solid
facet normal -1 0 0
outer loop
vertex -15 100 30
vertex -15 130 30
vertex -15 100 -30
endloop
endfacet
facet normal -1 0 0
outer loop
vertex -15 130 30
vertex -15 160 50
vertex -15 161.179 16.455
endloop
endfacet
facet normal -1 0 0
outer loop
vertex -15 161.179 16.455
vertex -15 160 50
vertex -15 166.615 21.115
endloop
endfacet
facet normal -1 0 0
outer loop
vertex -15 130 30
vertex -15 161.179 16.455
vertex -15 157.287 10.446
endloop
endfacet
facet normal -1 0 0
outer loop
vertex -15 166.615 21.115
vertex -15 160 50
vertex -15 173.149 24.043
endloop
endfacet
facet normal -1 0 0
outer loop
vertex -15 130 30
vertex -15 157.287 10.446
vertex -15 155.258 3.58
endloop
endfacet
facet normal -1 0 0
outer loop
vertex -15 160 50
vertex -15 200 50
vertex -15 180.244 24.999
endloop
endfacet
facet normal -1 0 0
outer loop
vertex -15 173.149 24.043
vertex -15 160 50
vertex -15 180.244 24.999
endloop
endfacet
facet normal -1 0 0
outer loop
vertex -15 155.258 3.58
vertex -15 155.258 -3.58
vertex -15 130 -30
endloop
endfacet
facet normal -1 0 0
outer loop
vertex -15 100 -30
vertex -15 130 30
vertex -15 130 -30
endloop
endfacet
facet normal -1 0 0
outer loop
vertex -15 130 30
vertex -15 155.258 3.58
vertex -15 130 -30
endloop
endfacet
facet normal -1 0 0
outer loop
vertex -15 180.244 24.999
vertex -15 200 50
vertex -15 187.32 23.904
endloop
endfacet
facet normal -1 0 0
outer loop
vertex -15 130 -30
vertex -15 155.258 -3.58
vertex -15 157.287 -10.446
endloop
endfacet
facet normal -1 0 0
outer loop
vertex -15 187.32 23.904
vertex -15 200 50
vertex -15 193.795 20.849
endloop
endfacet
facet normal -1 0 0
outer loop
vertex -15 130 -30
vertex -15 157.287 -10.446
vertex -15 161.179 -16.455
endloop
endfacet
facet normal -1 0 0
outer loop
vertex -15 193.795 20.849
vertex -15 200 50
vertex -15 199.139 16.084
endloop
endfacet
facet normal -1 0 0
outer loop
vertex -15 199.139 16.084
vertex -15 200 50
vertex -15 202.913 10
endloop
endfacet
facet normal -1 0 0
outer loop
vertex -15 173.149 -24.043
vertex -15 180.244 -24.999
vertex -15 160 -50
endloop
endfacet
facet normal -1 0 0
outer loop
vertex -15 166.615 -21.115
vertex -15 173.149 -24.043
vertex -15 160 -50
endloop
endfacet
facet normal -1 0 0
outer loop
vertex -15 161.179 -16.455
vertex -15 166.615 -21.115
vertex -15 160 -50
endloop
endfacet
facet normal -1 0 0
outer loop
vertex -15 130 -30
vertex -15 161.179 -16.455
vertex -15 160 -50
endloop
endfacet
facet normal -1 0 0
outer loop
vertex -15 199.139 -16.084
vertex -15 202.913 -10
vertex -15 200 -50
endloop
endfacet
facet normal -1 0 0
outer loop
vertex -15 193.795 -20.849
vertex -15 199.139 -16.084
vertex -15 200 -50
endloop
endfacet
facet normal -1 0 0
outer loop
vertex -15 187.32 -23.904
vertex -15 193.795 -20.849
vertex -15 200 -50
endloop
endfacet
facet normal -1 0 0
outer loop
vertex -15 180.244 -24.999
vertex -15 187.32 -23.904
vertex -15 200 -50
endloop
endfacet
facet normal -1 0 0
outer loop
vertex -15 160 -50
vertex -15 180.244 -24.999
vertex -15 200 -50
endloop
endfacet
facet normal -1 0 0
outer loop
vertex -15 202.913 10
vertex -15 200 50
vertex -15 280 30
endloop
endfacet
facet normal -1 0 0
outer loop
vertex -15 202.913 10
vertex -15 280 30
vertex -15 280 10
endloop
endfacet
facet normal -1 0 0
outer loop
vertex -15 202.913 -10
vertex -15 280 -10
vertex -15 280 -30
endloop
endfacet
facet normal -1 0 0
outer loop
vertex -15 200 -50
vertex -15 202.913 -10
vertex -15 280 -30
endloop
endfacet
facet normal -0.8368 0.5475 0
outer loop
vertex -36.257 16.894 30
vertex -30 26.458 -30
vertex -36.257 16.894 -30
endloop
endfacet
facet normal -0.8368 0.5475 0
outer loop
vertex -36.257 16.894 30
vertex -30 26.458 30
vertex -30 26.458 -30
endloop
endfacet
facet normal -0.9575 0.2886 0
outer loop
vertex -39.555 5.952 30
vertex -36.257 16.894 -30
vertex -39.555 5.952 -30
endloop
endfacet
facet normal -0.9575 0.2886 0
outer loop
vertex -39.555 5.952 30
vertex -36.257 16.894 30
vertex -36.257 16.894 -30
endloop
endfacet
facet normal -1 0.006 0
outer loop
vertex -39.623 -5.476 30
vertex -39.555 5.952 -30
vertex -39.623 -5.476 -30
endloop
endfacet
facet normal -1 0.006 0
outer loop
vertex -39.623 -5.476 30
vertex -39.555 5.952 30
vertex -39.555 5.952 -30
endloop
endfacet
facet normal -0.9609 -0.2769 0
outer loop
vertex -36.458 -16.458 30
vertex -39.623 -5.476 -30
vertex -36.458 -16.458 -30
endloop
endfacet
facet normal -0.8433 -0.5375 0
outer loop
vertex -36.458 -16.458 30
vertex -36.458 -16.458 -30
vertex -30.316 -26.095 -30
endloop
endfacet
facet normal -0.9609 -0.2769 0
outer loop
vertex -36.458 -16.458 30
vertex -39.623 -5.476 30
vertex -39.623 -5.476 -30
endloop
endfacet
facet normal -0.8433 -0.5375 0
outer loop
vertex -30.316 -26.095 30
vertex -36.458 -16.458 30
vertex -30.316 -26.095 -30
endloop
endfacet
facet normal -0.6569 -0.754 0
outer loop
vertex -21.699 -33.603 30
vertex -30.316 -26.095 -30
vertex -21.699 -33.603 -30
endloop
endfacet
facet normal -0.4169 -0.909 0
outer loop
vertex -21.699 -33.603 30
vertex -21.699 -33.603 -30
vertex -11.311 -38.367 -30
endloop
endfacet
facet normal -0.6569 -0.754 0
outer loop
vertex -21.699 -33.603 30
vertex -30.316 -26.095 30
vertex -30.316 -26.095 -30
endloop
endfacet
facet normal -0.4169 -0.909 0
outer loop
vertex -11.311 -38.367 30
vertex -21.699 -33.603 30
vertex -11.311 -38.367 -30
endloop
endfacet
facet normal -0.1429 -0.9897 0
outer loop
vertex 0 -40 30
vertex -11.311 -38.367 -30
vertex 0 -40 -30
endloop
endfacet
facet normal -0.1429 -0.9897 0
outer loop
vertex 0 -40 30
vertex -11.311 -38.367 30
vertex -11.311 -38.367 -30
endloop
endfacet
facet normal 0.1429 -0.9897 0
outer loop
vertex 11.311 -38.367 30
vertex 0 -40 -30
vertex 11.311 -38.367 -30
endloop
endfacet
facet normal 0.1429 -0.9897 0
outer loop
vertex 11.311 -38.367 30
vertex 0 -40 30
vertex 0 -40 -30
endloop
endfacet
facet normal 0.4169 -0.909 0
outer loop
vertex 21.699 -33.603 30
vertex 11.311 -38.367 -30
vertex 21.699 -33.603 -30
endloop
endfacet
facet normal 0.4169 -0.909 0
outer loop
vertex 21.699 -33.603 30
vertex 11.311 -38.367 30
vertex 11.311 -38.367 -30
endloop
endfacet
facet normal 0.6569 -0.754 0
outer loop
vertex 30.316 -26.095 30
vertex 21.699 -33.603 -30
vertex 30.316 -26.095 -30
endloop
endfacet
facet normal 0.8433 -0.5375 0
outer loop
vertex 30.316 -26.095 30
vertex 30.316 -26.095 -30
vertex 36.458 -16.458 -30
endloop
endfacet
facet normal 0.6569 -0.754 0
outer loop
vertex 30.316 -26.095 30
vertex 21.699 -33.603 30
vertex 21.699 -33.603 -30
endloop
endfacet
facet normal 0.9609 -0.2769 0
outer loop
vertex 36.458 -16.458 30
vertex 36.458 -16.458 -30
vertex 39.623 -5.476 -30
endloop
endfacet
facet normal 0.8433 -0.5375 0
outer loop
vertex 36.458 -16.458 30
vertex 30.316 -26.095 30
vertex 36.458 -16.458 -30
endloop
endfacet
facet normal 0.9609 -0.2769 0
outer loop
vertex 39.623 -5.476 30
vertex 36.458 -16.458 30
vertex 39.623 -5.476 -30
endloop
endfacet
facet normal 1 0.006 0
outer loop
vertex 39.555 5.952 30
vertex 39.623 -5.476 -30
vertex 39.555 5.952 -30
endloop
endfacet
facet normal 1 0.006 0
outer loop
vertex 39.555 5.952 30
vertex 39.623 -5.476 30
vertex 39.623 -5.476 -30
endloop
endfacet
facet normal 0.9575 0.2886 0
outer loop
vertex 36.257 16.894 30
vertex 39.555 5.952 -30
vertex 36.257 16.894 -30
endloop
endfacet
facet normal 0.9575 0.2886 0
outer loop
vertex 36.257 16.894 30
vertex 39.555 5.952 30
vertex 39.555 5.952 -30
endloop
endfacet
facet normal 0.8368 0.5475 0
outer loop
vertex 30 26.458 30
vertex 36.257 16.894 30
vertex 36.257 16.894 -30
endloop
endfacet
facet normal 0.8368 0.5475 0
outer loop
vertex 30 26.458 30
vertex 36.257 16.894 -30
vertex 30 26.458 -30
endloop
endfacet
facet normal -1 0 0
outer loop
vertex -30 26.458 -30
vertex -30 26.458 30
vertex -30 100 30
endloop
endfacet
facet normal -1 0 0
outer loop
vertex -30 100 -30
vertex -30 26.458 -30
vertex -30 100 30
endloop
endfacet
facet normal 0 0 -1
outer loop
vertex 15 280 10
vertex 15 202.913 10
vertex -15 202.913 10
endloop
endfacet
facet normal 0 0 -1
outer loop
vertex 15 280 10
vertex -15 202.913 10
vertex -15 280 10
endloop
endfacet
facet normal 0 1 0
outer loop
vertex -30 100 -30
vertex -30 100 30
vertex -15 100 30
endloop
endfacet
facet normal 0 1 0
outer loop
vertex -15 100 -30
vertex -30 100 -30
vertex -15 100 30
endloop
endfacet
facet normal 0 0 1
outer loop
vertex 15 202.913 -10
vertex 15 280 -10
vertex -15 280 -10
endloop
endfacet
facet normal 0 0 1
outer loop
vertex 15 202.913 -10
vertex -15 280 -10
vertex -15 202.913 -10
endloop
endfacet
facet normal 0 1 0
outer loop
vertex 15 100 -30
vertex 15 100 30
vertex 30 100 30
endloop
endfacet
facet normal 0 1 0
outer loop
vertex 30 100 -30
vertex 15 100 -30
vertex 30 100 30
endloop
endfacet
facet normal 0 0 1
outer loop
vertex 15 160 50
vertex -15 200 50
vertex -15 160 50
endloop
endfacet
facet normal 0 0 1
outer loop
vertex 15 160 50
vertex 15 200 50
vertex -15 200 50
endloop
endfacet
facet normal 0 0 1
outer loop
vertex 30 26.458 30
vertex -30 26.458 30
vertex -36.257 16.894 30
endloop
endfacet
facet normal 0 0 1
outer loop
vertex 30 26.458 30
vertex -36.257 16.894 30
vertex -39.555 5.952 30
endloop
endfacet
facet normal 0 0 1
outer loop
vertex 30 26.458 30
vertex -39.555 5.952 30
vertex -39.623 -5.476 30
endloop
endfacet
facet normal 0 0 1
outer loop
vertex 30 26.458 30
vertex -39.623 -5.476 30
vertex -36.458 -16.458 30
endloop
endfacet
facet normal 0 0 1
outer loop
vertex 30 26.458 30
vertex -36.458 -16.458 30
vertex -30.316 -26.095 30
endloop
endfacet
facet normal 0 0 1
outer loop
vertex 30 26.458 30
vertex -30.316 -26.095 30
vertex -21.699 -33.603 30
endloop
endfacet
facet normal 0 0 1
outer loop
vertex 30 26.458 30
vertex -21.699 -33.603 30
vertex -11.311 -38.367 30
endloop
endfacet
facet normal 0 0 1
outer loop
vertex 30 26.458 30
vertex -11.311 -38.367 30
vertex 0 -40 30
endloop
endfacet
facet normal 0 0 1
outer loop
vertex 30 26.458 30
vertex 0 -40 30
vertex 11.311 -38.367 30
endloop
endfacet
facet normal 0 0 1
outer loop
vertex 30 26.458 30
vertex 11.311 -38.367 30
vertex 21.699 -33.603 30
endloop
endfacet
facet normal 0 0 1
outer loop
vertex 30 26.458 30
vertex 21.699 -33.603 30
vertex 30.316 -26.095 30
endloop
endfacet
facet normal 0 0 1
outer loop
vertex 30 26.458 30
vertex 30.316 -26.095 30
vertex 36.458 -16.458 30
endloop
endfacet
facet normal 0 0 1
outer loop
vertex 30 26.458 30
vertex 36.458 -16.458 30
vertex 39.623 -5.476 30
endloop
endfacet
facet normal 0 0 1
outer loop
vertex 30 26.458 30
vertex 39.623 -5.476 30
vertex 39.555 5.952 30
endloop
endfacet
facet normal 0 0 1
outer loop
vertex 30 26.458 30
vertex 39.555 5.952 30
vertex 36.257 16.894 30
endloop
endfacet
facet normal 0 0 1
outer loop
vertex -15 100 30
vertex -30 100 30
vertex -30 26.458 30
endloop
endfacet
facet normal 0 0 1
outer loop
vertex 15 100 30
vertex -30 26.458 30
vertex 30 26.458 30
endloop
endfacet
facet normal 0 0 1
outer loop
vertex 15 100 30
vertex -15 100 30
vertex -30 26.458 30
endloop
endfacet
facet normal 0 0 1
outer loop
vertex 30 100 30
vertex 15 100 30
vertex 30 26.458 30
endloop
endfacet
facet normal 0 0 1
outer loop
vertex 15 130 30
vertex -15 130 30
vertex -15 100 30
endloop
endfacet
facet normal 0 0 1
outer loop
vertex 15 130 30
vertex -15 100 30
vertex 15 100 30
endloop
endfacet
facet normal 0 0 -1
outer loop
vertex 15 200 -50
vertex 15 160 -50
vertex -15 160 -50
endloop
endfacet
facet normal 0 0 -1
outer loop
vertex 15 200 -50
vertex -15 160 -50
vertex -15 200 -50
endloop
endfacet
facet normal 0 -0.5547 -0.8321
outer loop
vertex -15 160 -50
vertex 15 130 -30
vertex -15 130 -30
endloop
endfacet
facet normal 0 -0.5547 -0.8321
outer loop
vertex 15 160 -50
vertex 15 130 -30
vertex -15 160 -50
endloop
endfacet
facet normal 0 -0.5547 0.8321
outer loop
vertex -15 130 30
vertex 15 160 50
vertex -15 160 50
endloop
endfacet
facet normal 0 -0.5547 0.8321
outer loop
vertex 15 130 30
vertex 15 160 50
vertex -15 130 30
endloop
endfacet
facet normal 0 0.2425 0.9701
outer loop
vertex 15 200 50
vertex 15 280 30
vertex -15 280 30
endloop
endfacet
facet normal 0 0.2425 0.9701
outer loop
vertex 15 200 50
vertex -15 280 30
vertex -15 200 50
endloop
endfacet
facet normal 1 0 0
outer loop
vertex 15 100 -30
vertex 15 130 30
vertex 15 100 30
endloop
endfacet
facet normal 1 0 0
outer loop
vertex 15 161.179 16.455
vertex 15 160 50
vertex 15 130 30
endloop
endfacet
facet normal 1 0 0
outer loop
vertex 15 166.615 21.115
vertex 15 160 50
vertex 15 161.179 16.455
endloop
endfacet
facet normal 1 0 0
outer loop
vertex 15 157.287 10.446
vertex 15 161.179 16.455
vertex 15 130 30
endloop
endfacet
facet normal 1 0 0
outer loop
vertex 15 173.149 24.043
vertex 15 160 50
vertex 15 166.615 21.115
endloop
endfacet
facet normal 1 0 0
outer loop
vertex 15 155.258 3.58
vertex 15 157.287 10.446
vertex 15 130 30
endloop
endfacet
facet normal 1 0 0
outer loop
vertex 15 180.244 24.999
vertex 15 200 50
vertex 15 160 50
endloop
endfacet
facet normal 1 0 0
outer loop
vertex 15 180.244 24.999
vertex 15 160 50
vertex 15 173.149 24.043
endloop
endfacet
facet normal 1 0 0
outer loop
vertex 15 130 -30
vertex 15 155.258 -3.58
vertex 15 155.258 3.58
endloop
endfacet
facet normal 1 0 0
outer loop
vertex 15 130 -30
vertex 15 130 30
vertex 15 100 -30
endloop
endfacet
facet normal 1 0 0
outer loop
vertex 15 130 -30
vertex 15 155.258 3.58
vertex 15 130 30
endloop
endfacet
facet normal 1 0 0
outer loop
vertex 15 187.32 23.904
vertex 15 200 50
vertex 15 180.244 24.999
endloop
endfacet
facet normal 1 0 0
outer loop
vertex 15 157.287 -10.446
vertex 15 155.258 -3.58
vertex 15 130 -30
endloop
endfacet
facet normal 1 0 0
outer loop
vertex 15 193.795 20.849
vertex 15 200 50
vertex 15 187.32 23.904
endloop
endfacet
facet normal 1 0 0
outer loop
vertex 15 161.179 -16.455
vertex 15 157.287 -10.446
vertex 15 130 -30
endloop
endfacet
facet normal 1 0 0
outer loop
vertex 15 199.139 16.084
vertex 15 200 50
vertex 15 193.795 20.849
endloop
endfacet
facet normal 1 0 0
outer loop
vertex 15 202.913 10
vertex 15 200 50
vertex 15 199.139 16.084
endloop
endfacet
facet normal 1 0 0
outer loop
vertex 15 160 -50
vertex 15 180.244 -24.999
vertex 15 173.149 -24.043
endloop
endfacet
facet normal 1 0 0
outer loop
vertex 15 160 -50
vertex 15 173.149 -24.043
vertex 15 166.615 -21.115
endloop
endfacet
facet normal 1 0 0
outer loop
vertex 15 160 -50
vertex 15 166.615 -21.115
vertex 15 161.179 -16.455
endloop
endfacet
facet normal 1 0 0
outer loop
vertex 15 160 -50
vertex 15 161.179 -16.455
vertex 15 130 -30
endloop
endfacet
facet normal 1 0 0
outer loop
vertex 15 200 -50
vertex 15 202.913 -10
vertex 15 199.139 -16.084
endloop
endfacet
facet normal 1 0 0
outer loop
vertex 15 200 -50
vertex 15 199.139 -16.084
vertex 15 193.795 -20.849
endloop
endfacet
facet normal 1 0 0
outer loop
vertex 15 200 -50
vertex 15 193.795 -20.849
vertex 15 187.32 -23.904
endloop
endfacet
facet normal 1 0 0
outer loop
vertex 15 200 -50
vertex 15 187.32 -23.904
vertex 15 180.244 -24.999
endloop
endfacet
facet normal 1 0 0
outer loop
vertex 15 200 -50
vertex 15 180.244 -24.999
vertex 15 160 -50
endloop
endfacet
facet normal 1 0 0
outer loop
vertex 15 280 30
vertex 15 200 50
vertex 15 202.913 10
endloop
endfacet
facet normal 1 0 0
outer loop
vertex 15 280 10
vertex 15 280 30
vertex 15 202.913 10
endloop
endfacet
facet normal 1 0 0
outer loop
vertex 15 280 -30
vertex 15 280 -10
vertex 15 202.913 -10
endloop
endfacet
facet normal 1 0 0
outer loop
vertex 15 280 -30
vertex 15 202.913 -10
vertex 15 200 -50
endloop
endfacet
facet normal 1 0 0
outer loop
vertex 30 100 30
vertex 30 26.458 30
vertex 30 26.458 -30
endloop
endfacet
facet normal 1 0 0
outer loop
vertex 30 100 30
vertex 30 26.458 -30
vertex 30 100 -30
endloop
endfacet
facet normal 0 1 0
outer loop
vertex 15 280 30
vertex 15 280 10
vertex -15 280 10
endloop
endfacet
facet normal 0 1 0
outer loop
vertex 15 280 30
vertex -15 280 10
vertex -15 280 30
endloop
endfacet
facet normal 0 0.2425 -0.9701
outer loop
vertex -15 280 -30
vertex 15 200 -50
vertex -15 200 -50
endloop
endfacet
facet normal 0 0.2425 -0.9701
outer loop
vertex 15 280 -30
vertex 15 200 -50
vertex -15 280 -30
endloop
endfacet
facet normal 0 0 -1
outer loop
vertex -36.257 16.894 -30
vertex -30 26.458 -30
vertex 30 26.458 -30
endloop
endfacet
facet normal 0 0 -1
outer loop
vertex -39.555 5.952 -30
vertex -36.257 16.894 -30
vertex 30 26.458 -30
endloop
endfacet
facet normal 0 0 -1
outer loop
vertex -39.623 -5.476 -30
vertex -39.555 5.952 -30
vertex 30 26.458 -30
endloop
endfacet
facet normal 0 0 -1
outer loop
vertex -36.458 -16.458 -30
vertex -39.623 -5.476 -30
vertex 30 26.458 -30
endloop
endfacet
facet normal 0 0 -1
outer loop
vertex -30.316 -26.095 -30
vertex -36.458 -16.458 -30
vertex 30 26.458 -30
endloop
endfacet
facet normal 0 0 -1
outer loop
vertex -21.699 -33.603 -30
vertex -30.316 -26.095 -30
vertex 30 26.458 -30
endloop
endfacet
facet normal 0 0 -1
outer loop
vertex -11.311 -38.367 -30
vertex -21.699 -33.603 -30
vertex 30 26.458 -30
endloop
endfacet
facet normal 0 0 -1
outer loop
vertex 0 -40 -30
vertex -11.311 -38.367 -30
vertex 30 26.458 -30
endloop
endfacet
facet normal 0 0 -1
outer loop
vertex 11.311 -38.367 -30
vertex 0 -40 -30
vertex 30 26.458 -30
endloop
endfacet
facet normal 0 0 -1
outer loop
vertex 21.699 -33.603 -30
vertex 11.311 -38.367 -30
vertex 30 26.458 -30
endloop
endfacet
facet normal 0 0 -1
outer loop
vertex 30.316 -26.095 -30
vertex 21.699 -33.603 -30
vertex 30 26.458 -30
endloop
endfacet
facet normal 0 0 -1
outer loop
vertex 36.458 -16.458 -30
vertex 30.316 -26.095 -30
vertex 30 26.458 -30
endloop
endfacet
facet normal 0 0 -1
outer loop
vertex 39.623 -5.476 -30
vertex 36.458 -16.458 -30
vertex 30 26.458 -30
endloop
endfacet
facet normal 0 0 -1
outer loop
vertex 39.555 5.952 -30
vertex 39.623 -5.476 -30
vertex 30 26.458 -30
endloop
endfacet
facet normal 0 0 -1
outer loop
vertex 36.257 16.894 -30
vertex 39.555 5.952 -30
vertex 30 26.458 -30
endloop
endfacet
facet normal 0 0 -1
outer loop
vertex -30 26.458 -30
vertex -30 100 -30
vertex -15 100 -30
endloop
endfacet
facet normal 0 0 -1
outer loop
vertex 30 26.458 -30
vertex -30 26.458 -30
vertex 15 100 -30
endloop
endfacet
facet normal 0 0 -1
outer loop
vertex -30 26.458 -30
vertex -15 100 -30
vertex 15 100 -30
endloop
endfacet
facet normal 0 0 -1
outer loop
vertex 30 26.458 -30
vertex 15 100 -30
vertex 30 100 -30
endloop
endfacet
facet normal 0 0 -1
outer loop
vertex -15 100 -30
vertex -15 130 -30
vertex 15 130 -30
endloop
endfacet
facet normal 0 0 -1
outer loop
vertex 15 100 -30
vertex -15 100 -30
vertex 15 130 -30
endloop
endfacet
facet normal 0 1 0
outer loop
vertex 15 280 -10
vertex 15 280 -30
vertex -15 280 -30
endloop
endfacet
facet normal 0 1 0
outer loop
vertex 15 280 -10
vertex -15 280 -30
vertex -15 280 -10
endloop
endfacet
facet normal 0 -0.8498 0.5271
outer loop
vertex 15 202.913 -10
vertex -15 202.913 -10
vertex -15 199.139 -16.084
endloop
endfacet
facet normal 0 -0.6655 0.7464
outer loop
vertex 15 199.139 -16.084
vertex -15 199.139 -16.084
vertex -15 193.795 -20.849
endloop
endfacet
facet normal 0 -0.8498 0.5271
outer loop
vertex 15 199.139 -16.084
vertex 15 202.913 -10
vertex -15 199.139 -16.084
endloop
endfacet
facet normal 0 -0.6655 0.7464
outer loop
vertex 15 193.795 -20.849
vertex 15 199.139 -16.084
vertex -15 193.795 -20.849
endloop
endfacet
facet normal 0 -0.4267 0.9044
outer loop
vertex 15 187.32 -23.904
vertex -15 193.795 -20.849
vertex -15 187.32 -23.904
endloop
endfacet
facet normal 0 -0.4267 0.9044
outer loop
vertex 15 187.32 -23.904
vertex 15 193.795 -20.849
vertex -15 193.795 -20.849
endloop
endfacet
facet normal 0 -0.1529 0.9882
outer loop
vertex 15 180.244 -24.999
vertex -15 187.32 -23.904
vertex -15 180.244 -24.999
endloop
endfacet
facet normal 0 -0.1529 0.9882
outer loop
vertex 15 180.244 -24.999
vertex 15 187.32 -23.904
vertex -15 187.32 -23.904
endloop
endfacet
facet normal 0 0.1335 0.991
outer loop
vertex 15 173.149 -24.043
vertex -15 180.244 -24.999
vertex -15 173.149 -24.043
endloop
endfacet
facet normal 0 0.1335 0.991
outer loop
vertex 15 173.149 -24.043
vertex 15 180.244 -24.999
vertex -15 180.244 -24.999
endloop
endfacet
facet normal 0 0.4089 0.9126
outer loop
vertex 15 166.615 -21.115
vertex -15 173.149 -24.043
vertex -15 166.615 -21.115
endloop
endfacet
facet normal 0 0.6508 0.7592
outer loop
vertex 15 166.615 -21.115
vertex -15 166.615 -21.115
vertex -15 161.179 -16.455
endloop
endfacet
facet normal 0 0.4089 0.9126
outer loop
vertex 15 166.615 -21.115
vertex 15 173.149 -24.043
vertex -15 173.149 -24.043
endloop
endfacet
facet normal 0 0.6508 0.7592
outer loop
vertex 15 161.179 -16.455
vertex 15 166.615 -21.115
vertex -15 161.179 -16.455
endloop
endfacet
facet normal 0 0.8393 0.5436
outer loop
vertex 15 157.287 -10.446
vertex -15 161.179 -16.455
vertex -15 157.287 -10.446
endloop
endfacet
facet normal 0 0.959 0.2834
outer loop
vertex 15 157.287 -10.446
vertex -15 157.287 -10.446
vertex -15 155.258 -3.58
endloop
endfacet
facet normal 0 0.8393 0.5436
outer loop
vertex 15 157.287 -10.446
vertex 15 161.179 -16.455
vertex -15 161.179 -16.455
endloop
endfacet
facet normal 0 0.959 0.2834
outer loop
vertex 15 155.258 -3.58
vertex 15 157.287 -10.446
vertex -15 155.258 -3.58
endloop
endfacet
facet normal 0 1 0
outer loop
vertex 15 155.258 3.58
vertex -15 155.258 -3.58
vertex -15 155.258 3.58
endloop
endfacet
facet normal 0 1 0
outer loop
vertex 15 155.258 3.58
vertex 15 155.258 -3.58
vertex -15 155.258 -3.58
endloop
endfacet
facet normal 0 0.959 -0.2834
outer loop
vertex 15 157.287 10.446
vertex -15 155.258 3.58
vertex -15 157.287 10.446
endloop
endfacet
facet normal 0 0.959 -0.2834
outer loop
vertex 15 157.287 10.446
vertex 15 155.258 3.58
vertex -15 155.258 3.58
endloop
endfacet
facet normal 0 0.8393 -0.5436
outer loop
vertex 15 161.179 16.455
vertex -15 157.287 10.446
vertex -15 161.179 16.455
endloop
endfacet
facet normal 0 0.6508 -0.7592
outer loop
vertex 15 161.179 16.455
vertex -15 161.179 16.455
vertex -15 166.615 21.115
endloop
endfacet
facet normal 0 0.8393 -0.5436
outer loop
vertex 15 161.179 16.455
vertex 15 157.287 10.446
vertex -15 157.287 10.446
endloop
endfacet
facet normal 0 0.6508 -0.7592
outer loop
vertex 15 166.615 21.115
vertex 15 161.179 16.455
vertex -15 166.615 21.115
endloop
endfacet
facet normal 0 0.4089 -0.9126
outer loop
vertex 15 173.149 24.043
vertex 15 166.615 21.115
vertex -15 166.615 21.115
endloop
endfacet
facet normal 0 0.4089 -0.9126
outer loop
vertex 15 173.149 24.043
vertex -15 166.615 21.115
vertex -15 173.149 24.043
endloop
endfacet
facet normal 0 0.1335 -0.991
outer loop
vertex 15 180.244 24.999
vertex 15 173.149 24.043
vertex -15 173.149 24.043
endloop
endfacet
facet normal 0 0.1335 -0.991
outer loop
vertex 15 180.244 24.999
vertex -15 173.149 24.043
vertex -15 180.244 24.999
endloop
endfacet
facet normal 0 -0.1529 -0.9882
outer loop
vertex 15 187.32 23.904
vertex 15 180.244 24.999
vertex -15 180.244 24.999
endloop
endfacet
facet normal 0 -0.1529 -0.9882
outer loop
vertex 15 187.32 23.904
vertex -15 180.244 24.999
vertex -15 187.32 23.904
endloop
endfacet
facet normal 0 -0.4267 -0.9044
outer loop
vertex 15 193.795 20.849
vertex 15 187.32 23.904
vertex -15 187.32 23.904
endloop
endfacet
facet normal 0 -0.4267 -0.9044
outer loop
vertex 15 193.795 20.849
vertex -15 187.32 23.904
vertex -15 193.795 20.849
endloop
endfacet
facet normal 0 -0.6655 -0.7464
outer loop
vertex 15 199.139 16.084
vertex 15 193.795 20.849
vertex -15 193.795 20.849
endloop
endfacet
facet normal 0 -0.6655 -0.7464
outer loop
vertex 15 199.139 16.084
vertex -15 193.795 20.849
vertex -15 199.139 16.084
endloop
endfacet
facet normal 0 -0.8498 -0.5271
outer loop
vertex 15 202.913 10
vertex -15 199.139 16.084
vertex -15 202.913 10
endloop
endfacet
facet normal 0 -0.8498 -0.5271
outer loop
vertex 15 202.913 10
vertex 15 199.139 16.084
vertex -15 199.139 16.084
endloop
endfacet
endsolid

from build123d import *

# Parameters (mm, degrees)
CROQUIS1_R              = 40
SALIENTE_EXTRUIR1_DEPTH = 30
CROQUIS2_W              = 60
CROQUIS2_H              = 100
SALIENTE_EXTRUIR2_DEPTH = 30
SALIENTE_EXTRUIR3_DEPTH = 15


with BuildPart() as part:
    # Croquis1 → Saliente-Extruir1 (new, symmetric)
    with BuildSketch(Plane.XY):
        Circle(CROQUIS1_R)
    extrude(amount=SALIENTE_EXTRUIR1_DEPTH, both=True)

    # Croquis2 → Saliente-Extruir2 (add, symmetric)
    with BuildSketch(Plane.XY):
        with Locations((0, 50)):
            Rectangle(CROQUIS2_W, CROQUIS2_H)
    extrude(amount=SALIENTE_EXTRUIR2_DEPTH, both=True)

    # Croquis3 → Saliente-Extruir3 (add, symmetric)
    with BuildSketch(Plane(origin=(0, 0, 0), x_dir=(0, 0, -1), z_dir=(1, 0, 0))):
        with BuildLine():
            Line((-30, 130), (-30, 100))
            Line((-30, 100), (30, 100))
            Line((30, 100), (30, 130))
            Line((30, 130), (50, 160))
            Line((50, 160), (50, 200))
            Line((50, 200), (30, 280))
            Line((30, 280), (10, 280))
            Line((10, 280), (10, 202.912878475))
            ThreePointArc((10, 202.912878475), (0, 155), (-10, 202.912878475))
            Line((-10, 202.912878475), (-10, 280))
            Line((-10, 280), (-30, 280))
            Line((-30, 280), (-50, 200))
            Line((-50, 200), (-50, 160))
            Line((-50, 160), (-30, 130))
        make_face()
    extrude(amount=SALIENTE_EXTRUIR3_DEPTH, both=True)


solid = part.part
